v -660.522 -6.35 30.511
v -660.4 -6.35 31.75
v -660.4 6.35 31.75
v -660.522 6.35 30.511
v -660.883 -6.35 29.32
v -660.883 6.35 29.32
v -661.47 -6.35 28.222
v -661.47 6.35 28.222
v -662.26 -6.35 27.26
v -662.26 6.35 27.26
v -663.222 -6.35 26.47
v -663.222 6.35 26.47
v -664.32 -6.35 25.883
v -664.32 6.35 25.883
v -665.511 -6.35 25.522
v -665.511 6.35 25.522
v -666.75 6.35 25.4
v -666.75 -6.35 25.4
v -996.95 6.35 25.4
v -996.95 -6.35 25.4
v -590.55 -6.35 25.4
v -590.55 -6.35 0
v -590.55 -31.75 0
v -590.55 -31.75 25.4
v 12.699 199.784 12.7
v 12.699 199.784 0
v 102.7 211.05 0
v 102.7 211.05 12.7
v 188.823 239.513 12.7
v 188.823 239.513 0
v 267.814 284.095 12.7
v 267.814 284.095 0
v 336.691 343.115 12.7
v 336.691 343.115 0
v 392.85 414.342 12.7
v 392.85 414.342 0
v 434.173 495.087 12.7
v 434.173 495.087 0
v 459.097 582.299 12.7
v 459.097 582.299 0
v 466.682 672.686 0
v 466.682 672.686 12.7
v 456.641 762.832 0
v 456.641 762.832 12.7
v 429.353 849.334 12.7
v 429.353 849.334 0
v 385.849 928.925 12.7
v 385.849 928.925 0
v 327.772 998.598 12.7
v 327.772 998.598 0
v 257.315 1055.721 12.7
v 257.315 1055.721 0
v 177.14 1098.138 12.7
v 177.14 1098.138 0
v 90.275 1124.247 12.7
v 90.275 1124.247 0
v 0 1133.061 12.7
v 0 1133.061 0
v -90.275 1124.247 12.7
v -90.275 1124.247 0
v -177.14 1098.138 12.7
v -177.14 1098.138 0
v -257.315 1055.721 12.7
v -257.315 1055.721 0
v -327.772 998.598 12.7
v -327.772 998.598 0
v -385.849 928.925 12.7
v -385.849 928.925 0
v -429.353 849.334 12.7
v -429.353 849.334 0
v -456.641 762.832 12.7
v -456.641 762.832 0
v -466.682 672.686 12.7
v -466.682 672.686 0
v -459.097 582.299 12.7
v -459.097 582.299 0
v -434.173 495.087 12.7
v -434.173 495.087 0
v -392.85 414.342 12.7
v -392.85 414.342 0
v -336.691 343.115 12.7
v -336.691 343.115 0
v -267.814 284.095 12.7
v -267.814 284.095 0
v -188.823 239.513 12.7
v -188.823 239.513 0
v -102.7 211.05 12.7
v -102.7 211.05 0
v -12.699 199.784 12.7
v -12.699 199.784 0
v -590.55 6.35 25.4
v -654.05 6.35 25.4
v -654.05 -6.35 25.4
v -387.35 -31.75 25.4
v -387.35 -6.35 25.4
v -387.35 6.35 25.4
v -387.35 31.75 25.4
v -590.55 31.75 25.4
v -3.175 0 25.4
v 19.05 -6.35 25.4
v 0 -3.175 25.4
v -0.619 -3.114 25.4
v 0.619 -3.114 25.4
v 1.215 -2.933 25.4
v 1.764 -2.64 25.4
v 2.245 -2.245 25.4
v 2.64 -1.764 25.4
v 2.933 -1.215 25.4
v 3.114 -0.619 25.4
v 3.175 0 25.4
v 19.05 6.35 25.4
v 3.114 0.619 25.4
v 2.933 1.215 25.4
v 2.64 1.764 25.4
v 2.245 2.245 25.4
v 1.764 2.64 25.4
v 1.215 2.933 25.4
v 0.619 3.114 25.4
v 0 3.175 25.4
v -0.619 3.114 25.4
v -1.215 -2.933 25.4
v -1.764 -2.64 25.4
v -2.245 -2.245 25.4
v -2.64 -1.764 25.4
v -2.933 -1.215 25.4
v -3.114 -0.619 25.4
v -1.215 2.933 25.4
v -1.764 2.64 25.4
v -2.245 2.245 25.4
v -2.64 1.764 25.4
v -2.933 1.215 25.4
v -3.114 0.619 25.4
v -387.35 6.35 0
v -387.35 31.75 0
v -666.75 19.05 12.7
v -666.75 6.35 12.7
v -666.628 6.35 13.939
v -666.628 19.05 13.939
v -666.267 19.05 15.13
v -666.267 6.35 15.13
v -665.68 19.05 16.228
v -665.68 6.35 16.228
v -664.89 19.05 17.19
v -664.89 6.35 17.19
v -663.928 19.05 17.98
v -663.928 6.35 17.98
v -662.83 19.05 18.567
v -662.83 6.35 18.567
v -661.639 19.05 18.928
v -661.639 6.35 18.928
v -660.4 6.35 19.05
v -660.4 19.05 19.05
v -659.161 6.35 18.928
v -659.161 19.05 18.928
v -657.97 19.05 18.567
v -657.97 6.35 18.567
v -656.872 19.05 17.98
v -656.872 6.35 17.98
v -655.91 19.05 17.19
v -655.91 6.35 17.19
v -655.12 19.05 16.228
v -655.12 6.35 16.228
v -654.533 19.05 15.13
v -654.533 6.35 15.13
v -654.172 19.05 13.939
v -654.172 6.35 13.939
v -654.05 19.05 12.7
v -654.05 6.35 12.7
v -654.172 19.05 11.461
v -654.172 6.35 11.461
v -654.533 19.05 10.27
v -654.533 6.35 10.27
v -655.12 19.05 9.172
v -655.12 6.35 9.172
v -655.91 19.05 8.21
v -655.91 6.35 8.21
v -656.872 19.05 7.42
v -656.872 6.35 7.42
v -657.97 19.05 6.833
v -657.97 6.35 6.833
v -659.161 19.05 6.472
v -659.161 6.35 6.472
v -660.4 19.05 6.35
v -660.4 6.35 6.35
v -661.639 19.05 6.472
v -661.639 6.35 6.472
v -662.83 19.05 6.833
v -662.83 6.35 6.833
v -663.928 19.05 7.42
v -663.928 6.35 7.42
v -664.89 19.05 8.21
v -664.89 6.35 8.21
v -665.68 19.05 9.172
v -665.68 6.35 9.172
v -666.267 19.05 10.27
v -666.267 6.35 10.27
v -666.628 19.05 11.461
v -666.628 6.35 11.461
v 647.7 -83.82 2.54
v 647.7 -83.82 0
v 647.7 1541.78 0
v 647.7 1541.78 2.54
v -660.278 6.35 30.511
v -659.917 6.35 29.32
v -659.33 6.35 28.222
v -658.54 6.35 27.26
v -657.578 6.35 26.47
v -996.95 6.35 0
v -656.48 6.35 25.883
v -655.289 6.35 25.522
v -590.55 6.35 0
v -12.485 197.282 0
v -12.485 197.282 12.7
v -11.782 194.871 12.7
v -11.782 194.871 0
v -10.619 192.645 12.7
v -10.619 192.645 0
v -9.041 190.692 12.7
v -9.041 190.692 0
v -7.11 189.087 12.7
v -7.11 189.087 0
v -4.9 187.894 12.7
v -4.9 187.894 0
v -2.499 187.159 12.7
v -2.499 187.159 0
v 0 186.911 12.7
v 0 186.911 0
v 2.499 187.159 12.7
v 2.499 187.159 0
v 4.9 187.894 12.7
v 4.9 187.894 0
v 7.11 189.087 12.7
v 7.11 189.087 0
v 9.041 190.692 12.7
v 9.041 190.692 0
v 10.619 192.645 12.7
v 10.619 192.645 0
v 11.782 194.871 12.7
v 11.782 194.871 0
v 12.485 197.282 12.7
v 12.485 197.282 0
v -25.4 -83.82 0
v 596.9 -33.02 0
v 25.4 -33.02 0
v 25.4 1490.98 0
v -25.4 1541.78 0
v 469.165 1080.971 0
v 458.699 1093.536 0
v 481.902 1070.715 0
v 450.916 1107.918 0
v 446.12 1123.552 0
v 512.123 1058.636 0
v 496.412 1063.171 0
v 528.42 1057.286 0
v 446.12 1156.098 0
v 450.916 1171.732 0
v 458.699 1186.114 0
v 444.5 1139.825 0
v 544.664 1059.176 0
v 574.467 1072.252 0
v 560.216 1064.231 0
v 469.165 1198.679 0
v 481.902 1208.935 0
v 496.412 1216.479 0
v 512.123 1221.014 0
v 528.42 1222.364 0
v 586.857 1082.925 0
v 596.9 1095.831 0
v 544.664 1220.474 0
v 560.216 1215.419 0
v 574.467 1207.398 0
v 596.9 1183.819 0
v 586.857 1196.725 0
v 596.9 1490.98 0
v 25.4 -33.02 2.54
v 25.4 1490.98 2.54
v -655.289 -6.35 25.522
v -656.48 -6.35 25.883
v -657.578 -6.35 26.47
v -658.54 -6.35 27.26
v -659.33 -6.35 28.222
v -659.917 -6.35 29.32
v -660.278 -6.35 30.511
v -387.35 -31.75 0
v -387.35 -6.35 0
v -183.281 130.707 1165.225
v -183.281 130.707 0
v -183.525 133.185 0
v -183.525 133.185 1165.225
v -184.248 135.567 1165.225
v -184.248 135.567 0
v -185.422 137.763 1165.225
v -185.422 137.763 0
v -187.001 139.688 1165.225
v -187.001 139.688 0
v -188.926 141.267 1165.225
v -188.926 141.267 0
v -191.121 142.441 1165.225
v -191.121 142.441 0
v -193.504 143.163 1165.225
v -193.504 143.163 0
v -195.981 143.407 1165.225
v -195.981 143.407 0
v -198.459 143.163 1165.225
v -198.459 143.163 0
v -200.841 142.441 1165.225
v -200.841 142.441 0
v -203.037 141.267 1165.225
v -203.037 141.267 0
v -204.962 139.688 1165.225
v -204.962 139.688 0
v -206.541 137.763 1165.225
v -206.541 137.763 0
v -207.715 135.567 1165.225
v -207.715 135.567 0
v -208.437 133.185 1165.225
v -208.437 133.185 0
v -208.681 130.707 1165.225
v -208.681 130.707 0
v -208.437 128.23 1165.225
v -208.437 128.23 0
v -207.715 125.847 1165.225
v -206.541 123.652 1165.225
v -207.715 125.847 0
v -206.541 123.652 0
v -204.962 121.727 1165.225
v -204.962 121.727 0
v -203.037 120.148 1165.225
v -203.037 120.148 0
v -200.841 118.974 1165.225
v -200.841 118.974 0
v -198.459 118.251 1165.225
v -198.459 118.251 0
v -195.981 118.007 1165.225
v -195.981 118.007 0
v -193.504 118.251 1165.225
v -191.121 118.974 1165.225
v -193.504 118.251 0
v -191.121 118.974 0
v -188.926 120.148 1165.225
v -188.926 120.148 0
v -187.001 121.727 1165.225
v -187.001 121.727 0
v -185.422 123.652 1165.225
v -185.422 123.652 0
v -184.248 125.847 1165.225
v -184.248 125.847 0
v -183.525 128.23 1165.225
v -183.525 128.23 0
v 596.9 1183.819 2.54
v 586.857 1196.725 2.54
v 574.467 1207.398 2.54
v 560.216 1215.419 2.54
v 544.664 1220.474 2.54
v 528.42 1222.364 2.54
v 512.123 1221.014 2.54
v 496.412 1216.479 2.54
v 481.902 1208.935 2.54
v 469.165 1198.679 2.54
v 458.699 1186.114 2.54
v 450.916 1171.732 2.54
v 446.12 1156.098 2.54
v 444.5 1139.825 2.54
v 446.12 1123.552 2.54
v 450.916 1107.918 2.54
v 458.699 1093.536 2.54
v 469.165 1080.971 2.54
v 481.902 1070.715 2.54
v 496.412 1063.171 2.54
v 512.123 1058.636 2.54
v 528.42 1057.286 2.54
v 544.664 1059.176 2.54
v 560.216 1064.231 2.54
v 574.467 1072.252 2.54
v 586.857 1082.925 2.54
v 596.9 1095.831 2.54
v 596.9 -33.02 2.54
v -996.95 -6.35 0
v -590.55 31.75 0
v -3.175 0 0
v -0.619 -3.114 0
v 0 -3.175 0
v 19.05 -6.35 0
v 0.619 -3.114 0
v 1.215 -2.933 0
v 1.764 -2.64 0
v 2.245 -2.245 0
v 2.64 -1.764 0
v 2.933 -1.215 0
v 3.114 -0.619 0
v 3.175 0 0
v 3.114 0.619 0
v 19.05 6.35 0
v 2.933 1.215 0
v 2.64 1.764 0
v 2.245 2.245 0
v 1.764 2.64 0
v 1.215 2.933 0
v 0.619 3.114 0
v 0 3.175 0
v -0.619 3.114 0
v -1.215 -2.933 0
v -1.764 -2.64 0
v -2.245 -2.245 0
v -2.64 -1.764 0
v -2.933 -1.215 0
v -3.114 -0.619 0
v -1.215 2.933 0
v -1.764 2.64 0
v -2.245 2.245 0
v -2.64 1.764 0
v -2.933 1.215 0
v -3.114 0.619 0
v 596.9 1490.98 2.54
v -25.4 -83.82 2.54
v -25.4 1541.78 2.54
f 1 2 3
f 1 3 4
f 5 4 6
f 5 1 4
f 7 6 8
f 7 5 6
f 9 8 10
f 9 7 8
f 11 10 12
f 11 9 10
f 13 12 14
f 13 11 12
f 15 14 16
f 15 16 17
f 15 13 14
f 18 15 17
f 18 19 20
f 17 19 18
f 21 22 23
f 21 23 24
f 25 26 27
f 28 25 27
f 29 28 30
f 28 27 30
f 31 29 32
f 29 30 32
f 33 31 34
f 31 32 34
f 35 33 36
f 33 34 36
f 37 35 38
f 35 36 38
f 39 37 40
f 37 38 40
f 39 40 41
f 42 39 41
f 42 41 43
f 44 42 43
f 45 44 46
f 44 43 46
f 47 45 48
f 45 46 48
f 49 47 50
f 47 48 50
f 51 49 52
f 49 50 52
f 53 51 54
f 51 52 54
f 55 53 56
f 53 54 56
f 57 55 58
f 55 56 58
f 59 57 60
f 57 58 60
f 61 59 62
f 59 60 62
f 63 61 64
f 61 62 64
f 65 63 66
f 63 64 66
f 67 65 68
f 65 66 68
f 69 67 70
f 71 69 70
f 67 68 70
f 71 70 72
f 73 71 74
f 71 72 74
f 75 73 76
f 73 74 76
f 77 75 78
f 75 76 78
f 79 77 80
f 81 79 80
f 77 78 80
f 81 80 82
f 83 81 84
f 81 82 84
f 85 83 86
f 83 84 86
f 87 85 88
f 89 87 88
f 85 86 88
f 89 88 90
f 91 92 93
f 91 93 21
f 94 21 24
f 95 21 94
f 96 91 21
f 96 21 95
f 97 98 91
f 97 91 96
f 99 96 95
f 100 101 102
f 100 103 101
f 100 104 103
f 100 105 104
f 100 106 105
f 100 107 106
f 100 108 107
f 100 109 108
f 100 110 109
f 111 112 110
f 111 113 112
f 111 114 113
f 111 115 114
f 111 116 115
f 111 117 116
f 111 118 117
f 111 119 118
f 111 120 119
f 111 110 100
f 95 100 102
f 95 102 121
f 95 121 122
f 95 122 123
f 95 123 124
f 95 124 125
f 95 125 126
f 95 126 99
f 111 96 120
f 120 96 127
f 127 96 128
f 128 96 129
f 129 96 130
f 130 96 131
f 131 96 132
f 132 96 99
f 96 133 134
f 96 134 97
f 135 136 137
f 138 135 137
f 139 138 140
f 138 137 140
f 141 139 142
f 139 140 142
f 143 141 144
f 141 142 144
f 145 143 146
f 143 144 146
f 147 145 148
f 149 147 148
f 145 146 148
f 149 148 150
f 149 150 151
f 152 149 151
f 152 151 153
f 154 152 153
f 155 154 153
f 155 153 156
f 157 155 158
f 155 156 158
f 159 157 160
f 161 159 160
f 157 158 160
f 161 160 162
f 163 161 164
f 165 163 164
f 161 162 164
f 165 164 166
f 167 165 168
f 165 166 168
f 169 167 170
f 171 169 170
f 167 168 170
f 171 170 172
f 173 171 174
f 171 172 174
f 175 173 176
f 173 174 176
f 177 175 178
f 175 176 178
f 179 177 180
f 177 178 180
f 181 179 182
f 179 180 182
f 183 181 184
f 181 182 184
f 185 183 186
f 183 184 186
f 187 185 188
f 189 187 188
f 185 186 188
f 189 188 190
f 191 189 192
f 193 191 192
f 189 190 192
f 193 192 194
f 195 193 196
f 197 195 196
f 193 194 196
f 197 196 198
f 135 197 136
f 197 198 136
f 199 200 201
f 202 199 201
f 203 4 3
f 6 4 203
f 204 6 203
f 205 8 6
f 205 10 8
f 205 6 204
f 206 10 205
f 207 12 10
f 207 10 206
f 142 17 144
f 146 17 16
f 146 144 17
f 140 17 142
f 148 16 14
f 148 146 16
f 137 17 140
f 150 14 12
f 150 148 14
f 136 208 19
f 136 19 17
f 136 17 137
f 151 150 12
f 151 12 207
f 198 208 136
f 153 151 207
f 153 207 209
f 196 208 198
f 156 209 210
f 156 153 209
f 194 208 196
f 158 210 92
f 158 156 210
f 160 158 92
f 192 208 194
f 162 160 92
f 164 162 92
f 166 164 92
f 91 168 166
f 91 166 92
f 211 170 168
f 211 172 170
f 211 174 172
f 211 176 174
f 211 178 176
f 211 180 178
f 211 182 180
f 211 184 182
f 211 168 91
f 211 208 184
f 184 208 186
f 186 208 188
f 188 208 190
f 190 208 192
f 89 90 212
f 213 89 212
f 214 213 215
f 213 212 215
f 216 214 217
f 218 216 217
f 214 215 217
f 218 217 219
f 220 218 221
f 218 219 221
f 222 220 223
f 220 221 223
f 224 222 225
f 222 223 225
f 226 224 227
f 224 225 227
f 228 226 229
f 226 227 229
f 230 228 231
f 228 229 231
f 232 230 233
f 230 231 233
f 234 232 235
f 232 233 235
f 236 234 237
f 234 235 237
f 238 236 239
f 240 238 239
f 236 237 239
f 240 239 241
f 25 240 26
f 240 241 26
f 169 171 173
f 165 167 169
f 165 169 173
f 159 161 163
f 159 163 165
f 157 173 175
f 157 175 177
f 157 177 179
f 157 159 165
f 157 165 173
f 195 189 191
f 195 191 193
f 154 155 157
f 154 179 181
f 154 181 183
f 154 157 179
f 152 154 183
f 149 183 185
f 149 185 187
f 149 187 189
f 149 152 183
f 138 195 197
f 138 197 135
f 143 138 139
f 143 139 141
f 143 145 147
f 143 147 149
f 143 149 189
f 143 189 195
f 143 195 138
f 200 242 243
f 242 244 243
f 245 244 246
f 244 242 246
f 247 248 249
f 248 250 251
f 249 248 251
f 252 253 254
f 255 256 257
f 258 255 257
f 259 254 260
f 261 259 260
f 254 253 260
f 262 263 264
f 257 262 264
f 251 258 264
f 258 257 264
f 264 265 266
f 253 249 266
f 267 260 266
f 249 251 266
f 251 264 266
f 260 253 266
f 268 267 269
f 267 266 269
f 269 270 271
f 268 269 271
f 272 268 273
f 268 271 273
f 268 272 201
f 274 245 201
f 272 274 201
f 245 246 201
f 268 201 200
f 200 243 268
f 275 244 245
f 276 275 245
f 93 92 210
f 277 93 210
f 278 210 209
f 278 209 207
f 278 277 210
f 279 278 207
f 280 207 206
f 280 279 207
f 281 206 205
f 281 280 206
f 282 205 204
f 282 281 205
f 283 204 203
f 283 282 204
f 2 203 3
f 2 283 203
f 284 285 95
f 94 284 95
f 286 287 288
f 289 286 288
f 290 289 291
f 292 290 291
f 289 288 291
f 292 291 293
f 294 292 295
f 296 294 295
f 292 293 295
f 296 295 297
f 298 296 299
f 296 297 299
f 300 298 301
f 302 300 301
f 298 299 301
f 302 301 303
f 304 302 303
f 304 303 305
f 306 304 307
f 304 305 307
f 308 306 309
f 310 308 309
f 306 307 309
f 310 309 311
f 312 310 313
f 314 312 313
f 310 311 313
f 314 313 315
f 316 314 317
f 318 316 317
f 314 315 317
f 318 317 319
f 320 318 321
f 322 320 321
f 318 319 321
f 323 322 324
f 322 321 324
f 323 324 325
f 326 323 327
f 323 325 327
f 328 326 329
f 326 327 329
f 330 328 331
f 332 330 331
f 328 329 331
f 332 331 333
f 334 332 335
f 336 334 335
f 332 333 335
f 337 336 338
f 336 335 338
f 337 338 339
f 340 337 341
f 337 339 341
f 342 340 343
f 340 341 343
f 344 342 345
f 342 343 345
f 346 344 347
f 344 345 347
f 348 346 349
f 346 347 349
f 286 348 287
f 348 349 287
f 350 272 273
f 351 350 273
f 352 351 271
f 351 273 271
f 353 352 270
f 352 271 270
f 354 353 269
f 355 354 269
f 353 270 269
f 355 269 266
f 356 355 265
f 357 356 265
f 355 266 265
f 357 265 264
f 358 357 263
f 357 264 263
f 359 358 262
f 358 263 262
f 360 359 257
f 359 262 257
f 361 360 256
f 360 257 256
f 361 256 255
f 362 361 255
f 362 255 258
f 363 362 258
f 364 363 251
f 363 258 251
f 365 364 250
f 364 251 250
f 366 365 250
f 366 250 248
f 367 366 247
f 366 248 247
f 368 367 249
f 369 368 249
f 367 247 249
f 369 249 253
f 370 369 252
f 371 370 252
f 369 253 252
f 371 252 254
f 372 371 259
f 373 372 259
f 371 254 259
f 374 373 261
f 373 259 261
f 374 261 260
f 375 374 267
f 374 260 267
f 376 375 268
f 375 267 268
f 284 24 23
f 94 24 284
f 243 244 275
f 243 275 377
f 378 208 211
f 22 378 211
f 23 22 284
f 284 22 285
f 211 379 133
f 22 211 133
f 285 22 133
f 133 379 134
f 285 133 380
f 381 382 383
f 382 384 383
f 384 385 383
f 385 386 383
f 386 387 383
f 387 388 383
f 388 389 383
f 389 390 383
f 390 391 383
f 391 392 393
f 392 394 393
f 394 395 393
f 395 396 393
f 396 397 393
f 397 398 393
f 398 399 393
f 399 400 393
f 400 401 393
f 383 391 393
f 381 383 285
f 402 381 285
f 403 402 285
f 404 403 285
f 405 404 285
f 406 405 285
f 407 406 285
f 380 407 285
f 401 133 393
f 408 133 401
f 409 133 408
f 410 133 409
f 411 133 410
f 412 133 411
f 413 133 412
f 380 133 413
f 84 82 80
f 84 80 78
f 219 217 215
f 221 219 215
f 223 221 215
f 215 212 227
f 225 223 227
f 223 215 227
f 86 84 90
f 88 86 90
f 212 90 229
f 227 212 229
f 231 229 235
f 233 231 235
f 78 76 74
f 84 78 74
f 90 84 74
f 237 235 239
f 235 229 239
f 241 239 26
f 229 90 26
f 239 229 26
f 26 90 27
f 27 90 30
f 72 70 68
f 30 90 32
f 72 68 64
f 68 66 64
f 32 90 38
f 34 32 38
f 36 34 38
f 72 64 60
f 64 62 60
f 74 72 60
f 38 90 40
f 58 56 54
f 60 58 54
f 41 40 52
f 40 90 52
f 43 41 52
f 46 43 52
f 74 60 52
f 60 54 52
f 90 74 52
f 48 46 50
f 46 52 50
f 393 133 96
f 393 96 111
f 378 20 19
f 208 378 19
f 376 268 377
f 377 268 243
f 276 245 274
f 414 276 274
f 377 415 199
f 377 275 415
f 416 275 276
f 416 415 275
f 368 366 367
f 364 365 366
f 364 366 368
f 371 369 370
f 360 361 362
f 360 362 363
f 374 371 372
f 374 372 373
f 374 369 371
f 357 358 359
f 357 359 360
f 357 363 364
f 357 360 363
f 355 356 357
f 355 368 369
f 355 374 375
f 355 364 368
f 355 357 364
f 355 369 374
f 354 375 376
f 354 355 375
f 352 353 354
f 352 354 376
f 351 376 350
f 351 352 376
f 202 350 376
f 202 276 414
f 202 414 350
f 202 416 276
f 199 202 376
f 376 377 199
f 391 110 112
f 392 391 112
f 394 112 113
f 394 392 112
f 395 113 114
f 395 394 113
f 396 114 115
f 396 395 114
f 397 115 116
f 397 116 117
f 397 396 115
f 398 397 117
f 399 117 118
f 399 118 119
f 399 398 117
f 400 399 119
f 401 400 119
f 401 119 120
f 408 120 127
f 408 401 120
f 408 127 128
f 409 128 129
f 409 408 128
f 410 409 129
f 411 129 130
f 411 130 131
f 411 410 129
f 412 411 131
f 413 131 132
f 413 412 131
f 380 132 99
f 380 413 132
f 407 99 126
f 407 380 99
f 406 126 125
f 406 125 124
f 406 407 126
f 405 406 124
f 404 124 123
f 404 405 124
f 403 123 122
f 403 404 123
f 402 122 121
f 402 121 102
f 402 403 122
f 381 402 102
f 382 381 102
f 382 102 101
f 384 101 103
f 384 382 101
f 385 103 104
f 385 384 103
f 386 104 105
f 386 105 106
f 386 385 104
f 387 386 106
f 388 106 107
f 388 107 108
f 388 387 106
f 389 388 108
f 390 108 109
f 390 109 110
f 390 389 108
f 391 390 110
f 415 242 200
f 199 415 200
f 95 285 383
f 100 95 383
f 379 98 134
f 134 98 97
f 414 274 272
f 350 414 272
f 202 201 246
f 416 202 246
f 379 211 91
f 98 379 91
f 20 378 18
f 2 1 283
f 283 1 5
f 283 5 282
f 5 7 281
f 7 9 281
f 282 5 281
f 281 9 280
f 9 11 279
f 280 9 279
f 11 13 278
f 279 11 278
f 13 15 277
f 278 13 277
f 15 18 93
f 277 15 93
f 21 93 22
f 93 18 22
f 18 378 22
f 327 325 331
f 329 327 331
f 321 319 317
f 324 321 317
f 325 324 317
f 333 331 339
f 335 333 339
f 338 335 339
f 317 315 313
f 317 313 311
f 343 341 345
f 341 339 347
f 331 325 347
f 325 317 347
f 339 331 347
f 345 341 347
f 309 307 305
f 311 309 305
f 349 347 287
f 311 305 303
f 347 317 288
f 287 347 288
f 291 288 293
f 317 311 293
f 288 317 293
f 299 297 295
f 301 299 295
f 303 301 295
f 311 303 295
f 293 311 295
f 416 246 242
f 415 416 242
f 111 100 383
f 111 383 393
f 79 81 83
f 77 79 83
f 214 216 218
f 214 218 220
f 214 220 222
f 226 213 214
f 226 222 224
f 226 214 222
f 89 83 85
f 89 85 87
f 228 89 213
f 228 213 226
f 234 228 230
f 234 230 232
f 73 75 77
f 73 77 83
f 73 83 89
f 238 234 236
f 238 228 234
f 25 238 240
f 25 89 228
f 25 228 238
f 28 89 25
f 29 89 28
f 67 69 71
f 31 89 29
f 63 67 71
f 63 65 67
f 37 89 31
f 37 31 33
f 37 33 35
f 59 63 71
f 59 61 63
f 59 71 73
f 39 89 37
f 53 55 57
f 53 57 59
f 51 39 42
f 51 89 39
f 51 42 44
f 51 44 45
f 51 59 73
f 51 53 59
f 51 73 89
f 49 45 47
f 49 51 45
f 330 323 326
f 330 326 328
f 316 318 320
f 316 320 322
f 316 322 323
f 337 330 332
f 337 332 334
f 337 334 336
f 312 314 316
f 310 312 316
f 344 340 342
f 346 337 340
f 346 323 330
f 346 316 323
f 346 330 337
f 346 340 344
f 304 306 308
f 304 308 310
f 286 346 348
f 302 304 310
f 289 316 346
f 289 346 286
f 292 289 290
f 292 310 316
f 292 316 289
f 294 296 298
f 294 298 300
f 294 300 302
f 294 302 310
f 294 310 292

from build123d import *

# Parameters (mm, degrees)
F0_W      = 1016
F0_H      = 12.7
F0_R      = 3.175
F1_DEPTH  = 25.4
F2_R      = 6.35
F3_DEPTH  = 12.7
F5_DEPTH  = 12.7
F6_R      = 12.7
F7_DEPTH  = 1165.225
F9_DEPTH  = 12.7
F10_W     = 203.2
F10_H     = 25.4
F11_DEPTH = 25.4
F12_W     = 571.5
F12_H     = 50.8
F13_DEPTH = 2.54


# Not quite as in the source:
# - a pattern or mirror of a feature is missing from the dataset's text; its kind, count and spacing are read off the source's solid


with BuildPart() as f1:
    # F0 (on Top) → F1 (new body)
    with BuildSketch(Plane.XY):
        with Locations((-488.95, 0)):
            Rectangle(F0_W, F0_H)
        Circle(F0_R, mode=Mode.SUBTRACT)
    extrude(amount=F1_DEPTH)

    # F2 (on face) → F3 (join)
    with BuildSketch(Plane(origin=(0, 6.35, 0), x_dir=(-1, 0, 0), z_dir=(0, 1, 0))):
        with Locations((660.4, 12.7)):
            Circle(F2_R)
    extrude(amount=F3_DEPTH)

    # F8 (on face) → F9 (join)
    with BuildSketch(Plane.XZ.offset(6.35)):
        with BuildLine():
            ThreePointArc((-660.4, 31.75), (-662.2598719395, 27.2598719395), (-666.75, 25.4))
            Line((-666.75, 25.4), (-654.05, 25.4))
            ThreePointArc((-654.05, 25.4), (-658.5401280605, 27.2598719395), (-660.4, 31.75))
        make_face()
    extrude(amount=-F9_DEPTH)

    # F10 (on face) → F11 (join)
    with BuildSketch(Plane.XZ.offset(6.35)):
        with Locations((-488.95, 12.7)):
            Rectangle(F10_W, F10_H)
    f11 = extrude(amount=F11_DEPTH)

    # F11_copies: F11 across plane
    add(f11.mirror(Plane.ZX))


with BuildPart() as f5:
    # F4 (on Top) → F5 (new body)
    with BuildSketch(Plane.XY):
        with BuildLine():
            ThreePointArc((-12.6988245094, 199.7835319932), (0, 186.9107428776), (12.6988245094, 199.7835319932))
            ThreePointArc((12.6988245094, 199.7835319932), (0, 1133.0607428776), (-12.6988245094, 199.7835319932))
        make_face()
    extrude(amount=F5_DEPTH)


with BuildPart() as f7:
    # F6 (on Top) → F7 (new body)
    with BuildSketch(Plane.XY):
        with Locations((-195.9813982248, 130.7074129581)):
            Circle(F6_R)
    extrude(amount=F7_DEPTH)


with BuildPart() as f13:
    # F12 (on Top) → F13 (new body)
    with BuildSketch(Plane.XY):
        Polygon((-25.4, -83.82), (25.4, -83.82), (25.4, -33.02), (25.4, 1490.98), (25.4, 1541.78), (-25.4, 1541.78), align=None)
        with Locations((311.15, 1516.38)):
            Rectangle(F12_W, F12_H)
        with BuildLine():
            Line((596.9, -33.02), (596.9, -83.82))
            Line((596.9, -83.82), (647.7, -83.82))
            Line((647.7, -83.82), (647.7, 1541.78))
            Line((647.7, 1541.78), (596.9, 1541.78))
            Line((596.9, 1541.78), (596.9, 1490.98))
            Line((596.9, 1490.98), (596.9, 1183.8190905123))
            ThreePointArc((596.9, 1183.8190905123), (606.3614745797, 1162.7202505992), (609.6, 1139.825))
            ThreePointArc((609.6, 1139.825), (606.3614745797, 1116.9297494008), (596.9, 1095.8309094877))
            Line((596.9, 1095.8309094877), (596.9, -33.02))
        make_face()
        with BuildLine():
            ThreePointArc((596.9, 1183.8190905123), (444.5, 1139.825), (596.9, 1095.8309094877))
            Line((596.9, 1095.8309094877), (596.9, 1183.8190905123))
        make_face()
        with BuildLine():
            Line((596.9, 1183.8190905123), (596.9, 1095.8309094877))
            ThreePointArc((596.9, 1095.8309094877), (606.3614745797, 1116.9297494008), (609.6, 1139.825))
            ThreePointArc((609.6, 1139.825), (606.3614745797, 1162.7202505992), (596.9, 1183.8190905123))
        make_face()
        with Locations((311.15, -58.42)):
            Rectangle(F12_W, F12_H)
    extrude(amount=F13_DEPTH)


solid = Compound([f1.part, f5.part, f7.part, f13.part])
